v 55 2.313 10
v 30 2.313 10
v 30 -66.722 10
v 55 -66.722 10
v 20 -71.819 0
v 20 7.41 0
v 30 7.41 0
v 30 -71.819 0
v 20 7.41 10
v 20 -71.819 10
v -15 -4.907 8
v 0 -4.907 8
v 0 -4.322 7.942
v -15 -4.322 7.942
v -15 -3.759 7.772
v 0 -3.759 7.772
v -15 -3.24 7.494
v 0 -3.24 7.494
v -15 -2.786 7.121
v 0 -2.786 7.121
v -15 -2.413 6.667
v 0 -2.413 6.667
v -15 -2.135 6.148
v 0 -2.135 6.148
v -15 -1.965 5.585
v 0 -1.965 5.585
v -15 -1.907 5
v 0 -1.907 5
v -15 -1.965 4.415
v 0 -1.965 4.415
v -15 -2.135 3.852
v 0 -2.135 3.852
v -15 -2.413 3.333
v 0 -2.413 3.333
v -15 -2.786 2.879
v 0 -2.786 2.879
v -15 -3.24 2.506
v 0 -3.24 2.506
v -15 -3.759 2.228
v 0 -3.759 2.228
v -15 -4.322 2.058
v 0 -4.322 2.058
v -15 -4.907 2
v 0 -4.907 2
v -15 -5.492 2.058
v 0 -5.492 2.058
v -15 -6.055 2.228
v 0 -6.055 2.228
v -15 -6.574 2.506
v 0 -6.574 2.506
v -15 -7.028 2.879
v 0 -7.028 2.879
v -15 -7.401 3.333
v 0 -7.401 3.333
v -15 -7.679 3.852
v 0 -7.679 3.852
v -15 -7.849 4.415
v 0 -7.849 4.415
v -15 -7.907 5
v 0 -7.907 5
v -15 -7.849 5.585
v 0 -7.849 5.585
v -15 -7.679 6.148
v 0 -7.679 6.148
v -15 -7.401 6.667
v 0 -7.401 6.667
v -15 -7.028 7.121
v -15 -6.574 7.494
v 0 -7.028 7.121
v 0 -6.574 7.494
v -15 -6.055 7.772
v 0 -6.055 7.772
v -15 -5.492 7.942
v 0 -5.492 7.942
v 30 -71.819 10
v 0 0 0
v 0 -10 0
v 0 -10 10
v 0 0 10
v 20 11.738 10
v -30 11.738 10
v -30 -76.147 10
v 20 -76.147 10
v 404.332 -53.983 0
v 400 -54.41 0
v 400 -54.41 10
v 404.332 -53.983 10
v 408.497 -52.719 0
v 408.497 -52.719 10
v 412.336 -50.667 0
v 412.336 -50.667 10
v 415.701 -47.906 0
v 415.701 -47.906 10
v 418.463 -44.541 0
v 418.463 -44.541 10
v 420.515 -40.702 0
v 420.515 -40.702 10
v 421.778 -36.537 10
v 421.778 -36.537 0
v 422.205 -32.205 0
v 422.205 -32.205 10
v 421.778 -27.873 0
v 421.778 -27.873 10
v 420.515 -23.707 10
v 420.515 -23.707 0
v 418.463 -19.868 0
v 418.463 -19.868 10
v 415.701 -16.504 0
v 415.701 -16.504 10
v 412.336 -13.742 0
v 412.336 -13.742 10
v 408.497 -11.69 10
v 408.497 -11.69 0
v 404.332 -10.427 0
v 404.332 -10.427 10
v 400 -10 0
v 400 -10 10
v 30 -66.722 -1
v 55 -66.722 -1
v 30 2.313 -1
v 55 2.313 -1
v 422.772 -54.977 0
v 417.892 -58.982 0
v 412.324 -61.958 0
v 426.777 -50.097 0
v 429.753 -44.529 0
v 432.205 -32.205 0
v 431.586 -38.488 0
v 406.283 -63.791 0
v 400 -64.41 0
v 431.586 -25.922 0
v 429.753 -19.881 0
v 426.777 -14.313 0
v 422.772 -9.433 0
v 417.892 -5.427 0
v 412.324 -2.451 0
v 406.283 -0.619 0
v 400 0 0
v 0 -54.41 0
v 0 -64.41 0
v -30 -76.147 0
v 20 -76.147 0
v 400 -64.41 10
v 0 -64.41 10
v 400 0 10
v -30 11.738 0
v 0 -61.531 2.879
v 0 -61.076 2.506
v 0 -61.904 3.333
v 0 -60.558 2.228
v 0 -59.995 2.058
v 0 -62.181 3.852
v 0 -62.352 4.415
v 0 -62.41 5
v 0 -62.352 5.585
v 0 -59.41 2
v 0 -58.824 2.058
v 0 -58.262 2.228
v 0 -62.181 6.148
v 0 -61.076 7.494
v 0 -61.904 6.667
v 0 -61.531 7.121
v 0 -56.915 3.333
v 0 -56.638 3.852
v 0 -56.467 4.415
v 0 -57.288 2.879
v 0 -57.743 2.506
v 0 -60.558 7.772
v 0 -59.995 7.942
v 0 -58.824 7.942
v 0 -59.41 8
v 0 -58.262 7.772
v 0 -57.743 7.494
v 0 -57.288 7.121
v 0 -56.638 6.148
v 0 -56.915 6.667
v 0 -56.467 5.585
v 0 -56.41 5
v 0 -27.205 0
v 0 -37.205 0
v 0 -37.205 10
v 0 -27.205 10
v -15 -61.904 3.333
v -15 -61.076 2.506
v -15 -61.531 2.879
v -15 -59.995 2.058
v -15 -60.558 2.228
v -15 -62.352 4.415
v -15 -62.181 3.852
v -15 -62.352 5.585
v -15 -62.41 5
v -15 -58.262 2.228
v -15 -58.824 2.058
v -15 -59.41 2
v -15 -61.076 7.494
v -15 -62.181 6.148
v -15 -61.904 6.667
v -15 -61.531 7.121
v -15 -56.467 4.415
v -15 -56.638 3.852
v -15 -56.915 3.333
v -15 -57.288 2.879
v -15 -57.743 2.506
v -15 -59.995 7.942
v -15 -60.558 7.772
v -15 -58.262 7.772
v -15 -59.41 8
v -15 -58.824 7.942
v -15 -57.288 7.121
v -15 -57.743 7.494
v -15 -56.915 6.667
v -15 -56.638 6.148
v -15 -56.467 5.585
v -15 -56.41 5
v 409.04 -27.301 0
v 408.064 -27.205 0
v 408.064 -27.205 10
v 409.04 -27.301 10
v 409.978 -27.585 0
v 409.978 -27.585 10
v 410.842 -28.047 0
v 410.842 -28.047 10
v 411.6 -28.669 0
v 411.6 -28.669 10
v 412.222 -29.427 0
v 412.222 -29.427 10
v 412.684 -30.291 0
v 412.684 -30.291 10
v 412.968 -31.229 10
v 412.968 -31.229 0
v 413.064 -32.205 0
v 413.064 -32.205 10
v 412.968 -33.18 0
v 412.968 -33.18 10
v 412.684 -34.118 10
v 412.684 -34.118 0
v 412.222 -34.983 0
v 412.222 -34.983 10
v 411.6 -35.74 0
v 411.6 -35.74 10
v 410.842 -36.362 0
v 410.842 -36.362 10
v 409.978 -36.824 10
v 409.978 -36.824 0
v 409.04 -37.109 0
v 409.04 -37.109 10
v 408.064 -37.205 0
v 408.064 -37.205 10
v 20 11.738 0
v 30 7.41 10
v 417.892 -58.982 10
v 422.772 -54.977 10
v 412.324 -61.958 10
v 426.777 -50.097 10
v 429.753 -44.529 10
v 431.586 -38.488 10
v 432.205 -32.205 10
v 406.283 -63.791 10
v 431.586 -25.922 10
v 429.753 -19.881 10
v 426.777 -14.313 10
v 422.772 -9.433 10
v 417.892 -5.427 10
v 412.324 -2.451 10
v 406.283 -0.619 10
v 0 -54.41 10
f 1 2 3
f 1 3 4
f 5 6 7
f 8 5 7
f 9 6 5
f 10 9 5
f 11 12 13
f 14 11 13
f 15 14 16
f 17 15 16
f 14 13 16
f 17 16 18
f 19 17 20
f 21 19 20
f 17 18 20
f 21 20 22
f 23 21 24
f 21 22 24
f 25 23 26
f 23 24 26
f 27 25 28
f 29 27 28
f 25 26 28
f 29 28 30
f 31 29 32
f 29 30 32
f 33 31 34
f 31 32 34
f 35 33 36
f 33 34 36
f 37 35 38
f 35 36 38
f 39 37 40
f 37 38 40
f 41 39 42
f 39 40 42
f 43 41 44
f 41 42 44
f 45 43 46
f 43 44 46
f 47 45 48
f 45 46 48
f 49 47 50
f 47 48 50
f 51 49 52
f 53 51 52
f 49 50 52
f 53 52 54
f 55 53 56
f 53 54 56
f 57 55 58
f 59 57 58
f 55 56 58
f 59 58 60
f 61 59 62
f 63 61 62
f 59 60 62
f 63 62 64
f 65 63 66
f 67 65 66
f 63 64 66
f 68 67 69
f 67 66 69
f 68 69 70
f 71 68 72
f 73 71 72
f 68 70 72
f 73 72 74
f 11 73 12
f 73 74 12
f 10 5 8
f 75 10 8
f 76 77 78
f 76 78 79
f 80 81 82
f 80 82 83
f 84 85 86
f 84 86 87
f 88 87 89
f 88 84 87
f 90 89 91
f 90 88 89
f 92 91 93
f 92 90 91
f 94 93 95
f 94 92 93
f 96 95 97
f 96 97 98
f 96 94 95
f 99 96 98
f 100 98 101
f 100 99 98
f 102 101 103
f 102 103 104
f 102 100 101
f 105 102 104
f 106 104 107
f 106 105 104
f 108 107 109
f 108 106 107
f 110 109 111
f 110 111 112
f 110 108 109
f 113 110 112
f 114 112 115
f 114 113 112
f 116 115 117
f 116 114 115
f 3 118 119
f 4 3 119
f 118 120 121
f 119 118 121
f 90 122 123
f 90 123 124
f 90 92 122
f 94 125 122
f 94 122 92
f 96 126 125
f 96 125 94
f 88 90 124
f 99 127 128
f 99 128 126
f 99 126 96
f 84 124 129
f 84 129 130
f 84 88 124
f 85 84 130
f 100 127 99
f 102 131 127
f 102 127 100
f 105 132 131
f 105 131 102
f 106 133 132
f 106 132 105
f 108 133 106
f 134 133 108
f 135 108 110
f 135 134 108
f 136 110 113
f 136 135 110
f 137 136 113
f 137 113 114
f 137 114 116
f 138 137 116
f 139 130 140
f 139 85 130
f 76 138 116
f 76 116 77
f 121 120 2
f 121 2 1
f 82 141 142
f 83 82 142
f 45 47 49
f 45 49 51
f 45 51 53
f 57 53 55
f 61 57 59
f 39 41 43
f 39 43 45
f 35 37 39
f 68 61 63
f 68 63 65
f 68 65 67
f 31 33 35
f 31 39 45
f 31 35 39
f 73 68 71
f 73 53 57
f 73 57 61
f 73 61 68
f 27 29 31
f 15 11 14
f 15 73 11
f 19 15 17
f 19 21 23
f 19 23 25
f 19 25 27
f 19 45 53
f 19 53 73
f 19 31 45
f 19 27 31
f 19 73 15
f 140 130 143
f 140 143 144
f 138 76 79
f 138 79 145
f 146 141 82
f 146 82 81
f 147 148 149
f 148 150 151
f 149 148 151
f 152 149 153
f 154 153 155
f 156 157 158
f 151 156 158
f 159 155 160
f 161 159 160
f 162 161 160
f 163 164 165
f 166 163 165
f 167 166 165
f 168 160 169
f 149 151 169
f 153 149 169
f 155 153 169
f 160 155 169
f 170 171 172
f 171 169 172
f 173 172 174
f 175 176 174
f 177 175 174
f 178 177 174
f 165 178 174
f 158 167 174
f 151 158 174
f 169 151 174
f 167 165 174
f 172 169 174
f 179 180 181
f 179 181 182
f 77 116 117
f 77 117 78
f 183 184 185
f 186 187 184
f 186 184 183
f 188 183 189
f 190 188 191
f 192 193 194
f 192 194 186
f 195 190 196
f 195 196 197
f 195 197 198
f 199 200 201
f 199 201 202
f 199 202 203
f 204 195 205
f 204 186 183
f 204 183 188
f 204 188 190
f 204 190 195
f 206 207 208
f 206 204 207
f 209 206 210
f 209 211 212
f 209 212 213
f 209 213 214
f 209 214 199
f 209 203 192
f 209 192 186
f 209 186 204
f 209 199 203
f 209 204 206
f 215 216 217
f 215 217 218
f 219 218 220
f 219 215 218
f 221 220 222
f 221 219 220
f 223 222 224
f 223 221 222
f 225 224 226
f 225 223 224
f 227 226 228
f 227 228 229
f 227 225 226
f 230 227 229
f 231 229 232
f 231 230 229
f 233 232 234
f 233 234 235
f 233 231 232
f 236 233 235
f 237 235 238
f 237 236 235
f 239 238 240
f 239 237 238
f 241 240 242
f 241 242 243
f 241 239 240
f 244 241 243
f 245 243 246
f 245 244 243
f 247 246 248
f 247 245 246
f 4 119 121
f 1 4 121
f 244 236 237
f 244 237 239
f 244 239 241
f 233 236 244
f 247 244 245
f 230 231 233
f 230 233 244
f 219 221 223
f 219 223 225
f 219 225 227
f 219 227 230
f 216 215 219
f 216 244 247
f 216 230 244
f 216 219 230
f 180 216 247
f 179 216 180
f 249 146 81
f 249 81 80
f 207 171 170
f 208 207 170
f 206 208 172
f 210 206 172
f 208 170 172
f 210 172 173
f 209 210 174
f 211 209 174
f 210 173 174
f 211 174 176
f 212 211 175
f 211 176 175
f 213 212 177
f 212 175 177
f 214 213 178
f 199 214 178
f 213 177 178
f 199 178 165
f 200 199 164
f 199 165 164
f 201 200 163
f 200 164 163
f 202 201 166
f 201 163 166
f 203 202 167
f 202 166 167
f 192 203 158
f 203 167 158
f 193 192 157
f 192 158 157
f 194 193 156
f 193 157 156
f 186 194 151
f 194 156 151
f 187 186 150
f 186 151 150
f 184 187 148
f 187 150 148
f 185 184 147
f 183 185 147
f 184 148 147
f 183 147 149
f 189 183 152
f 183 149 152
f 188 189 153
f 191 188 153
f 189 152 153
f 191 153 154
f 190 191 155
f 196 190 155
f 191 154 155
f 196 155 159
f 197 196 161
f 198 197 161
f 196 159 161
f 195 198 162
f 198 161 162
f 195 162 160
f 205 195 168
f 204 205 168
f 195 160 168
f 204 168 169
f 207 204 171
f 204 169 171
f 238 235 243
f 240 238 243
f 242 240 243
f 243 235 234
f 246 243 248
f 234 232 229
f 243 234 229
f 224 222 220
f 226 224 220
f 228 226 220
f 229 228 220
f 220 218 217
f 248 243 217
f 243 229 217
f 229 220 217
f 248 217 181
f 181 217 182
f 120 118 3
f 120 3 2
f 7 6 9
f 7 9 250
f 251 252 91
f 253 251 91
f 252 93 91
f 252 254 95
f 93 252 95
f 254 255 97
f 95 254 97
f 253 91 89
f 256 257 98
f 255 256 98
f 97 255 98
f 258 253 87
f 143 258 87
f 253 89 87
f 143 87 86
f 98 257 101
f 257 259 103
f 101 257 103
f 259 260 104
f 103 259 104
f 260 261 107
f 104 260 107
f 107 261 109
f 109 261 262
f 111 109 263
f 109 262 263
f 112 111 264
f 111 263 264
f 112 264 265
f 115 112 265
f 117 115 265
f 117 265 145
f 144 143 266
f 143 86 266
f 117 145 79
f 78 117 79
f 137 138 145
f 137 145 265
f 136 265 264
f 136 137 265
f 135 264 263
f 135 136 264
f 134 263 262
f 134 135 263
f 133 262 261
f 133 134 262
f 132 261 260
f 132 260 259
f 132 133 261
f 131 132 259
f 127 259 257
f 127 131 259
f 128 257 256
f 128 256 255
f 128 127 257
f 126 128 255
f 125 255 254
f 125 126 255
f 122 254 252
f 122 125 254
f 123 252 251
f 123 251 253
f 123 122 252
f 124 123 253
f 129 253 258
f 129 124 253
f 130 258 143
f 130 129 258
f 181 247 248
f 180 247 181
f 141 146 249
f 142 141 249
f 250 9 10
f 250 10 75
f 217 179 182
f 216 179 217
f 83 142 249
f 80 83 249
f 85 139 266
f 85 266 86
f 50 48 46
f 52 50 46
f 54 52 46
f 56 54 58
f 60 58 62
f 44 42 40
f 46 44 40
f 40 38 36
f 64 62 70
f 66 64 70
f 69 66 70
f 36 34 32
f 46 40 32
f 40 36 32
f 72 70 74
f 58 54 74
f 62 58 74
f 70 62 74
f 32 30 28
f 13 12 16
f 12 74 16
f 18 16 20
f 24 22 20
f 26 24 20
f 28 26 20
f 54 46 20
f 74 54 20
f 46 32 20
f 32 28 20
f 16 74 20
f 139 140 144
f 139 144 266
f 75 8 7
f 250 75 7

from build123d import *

# Parameters (mm, degrees)
BOSS_EXTRUDE1_DEPTH      = 10
BOSS_EXTRUDE1_2_DEPTH    = 10
SKETCH2_R                = 3
BOSS_EXTRUDE2_DEPTH      = 15
SKETCH3_R                = 3
BOSS_EXTRUDE3_DEPTH      = 15
BOSS_EXTRUDE4_DEPTH      = 10
BOSS_EXTRUDE4_DEPTH_BACK = 1
SKETCH4_W                = 25
SKETCH4_H                = 69.034871012
SKETCH5_W                = 10
SKETCH5_H                = 39.614540043
BOSS_EXTRUDE6_DEPTH      = 10
SKETCH6_W                = 50
SKETCH6_H                = 87.884968957
BOSS_EXTRUDE7_DEPTH      = 10


with BuildPart() as part:
    # Sketch1 → Boss-Extrude1 (new body)
    with BuildSketch(Plane.XY):
        with BuildLine():
            Line((0, 0), (400, 0))
            ThreePointArc((400, 0), (432.204842223, -32.204842223), (400, -64.409684446))
            Line((400, -64.409684446), (0, -64.409684446))
            Line((0, -64.409684446), (0, -54.409684446))
            Line((0, -54.409684446), (400, -54.409684446))
            ThreePointArc((400, -54.409684446), (422.204842223, -32.204842223), (400, -10))
            Line((400, -10), (0, -10))
            Line((0, -10), (0, 0))
        make_face()
    extrude(amount=BOSS_EXTRUDE1_DEPTH)


with BuildPart() as body_2:
    # Sketch1 → Boss-Extrude1 2 (new body)
    with BuildSketch(Plane.XY):
        with BuildLine():
            Line((0, -27.204842223), (408.064158914, -27.204842223))
            ThreePointArc((408.064158914, -27.204842223), (413.064158914, -32.204842223), (408.064158914, -37.204842223))
            Line((408.064158914, -37.204842223), (0, -37.204842223))
            Line((0, -37.204842223), (0, -27.204842223))
        make_face()
    extrude(amount=BOSS_EXTRUDE1_2_DEPTH)


with BuildPart() as body_3:
    # Sketch2 → Boss-Extrude2 (new body)
    with BuildSketch(Plane.ZY):
        with Locations((5, -4.906979909)):
            Circle(SKETCH2_R)
    extrude(amount=BOSS_EXTRUDE2_DEPTH)


with BuildPart() as body_4:
    # Sketch3 → Boss-Extrude3 (new body)
    with BuildSketch(Plane.ZY):
        with Locations((5, -59.409684446)):
            Circle(SKETCH3_R)
    extrude(amount=BOSS_EXTRUDE3_DEPTH)


with BuildPart() as body_5:
    # Sketch4 → Boss-Extrude4 (new, two sides: drawn at the far end of the back side and taken through both)
    with BuildSketch(Plane.XY.offset(-BOSS_EXTRUDE4_DEPTH_BACK)):
        with Locations((42.5, -32.204842223)):
            Rectangle(SKETCH4_W, SKETCH4_H)
    extrude(amount=BOSS_EXTRUDE4_DEPTH + BOSS_EXTRUDE4_DEPTH_BACK)


with BuildPart() as body_6:
    # Sketch5 → Boss-Extrude6 (new body)
    with BuildSketch(Plane.XY):
        with Locations((25, -12.397572201)):
            Rectangle(SKETCH5_W, SKETCH5_H)
        with Locations((25, -52.012112245)):
            Rectangle(SKETCH5_W, SKETCH5_H)
    extrude(amount=BOSS_EXTRUDE6_DEPTH)


with BuildPart() as body_7:
    # Sketch6 → Boss-Extrude7 (new body)
    with BuildSketch(Plane.XY):
        with Locations((-5, -32.204842224)):
            Rectangle(SKETCH6_W, SKETCH6_H)
    extrude(amount=BOSS_EXTRUDE7_DEPTH)


solid = Compound([part.part, body_2.part, body_3.part, body_4.part, body_5.part, body_6.part, body_7.part])
